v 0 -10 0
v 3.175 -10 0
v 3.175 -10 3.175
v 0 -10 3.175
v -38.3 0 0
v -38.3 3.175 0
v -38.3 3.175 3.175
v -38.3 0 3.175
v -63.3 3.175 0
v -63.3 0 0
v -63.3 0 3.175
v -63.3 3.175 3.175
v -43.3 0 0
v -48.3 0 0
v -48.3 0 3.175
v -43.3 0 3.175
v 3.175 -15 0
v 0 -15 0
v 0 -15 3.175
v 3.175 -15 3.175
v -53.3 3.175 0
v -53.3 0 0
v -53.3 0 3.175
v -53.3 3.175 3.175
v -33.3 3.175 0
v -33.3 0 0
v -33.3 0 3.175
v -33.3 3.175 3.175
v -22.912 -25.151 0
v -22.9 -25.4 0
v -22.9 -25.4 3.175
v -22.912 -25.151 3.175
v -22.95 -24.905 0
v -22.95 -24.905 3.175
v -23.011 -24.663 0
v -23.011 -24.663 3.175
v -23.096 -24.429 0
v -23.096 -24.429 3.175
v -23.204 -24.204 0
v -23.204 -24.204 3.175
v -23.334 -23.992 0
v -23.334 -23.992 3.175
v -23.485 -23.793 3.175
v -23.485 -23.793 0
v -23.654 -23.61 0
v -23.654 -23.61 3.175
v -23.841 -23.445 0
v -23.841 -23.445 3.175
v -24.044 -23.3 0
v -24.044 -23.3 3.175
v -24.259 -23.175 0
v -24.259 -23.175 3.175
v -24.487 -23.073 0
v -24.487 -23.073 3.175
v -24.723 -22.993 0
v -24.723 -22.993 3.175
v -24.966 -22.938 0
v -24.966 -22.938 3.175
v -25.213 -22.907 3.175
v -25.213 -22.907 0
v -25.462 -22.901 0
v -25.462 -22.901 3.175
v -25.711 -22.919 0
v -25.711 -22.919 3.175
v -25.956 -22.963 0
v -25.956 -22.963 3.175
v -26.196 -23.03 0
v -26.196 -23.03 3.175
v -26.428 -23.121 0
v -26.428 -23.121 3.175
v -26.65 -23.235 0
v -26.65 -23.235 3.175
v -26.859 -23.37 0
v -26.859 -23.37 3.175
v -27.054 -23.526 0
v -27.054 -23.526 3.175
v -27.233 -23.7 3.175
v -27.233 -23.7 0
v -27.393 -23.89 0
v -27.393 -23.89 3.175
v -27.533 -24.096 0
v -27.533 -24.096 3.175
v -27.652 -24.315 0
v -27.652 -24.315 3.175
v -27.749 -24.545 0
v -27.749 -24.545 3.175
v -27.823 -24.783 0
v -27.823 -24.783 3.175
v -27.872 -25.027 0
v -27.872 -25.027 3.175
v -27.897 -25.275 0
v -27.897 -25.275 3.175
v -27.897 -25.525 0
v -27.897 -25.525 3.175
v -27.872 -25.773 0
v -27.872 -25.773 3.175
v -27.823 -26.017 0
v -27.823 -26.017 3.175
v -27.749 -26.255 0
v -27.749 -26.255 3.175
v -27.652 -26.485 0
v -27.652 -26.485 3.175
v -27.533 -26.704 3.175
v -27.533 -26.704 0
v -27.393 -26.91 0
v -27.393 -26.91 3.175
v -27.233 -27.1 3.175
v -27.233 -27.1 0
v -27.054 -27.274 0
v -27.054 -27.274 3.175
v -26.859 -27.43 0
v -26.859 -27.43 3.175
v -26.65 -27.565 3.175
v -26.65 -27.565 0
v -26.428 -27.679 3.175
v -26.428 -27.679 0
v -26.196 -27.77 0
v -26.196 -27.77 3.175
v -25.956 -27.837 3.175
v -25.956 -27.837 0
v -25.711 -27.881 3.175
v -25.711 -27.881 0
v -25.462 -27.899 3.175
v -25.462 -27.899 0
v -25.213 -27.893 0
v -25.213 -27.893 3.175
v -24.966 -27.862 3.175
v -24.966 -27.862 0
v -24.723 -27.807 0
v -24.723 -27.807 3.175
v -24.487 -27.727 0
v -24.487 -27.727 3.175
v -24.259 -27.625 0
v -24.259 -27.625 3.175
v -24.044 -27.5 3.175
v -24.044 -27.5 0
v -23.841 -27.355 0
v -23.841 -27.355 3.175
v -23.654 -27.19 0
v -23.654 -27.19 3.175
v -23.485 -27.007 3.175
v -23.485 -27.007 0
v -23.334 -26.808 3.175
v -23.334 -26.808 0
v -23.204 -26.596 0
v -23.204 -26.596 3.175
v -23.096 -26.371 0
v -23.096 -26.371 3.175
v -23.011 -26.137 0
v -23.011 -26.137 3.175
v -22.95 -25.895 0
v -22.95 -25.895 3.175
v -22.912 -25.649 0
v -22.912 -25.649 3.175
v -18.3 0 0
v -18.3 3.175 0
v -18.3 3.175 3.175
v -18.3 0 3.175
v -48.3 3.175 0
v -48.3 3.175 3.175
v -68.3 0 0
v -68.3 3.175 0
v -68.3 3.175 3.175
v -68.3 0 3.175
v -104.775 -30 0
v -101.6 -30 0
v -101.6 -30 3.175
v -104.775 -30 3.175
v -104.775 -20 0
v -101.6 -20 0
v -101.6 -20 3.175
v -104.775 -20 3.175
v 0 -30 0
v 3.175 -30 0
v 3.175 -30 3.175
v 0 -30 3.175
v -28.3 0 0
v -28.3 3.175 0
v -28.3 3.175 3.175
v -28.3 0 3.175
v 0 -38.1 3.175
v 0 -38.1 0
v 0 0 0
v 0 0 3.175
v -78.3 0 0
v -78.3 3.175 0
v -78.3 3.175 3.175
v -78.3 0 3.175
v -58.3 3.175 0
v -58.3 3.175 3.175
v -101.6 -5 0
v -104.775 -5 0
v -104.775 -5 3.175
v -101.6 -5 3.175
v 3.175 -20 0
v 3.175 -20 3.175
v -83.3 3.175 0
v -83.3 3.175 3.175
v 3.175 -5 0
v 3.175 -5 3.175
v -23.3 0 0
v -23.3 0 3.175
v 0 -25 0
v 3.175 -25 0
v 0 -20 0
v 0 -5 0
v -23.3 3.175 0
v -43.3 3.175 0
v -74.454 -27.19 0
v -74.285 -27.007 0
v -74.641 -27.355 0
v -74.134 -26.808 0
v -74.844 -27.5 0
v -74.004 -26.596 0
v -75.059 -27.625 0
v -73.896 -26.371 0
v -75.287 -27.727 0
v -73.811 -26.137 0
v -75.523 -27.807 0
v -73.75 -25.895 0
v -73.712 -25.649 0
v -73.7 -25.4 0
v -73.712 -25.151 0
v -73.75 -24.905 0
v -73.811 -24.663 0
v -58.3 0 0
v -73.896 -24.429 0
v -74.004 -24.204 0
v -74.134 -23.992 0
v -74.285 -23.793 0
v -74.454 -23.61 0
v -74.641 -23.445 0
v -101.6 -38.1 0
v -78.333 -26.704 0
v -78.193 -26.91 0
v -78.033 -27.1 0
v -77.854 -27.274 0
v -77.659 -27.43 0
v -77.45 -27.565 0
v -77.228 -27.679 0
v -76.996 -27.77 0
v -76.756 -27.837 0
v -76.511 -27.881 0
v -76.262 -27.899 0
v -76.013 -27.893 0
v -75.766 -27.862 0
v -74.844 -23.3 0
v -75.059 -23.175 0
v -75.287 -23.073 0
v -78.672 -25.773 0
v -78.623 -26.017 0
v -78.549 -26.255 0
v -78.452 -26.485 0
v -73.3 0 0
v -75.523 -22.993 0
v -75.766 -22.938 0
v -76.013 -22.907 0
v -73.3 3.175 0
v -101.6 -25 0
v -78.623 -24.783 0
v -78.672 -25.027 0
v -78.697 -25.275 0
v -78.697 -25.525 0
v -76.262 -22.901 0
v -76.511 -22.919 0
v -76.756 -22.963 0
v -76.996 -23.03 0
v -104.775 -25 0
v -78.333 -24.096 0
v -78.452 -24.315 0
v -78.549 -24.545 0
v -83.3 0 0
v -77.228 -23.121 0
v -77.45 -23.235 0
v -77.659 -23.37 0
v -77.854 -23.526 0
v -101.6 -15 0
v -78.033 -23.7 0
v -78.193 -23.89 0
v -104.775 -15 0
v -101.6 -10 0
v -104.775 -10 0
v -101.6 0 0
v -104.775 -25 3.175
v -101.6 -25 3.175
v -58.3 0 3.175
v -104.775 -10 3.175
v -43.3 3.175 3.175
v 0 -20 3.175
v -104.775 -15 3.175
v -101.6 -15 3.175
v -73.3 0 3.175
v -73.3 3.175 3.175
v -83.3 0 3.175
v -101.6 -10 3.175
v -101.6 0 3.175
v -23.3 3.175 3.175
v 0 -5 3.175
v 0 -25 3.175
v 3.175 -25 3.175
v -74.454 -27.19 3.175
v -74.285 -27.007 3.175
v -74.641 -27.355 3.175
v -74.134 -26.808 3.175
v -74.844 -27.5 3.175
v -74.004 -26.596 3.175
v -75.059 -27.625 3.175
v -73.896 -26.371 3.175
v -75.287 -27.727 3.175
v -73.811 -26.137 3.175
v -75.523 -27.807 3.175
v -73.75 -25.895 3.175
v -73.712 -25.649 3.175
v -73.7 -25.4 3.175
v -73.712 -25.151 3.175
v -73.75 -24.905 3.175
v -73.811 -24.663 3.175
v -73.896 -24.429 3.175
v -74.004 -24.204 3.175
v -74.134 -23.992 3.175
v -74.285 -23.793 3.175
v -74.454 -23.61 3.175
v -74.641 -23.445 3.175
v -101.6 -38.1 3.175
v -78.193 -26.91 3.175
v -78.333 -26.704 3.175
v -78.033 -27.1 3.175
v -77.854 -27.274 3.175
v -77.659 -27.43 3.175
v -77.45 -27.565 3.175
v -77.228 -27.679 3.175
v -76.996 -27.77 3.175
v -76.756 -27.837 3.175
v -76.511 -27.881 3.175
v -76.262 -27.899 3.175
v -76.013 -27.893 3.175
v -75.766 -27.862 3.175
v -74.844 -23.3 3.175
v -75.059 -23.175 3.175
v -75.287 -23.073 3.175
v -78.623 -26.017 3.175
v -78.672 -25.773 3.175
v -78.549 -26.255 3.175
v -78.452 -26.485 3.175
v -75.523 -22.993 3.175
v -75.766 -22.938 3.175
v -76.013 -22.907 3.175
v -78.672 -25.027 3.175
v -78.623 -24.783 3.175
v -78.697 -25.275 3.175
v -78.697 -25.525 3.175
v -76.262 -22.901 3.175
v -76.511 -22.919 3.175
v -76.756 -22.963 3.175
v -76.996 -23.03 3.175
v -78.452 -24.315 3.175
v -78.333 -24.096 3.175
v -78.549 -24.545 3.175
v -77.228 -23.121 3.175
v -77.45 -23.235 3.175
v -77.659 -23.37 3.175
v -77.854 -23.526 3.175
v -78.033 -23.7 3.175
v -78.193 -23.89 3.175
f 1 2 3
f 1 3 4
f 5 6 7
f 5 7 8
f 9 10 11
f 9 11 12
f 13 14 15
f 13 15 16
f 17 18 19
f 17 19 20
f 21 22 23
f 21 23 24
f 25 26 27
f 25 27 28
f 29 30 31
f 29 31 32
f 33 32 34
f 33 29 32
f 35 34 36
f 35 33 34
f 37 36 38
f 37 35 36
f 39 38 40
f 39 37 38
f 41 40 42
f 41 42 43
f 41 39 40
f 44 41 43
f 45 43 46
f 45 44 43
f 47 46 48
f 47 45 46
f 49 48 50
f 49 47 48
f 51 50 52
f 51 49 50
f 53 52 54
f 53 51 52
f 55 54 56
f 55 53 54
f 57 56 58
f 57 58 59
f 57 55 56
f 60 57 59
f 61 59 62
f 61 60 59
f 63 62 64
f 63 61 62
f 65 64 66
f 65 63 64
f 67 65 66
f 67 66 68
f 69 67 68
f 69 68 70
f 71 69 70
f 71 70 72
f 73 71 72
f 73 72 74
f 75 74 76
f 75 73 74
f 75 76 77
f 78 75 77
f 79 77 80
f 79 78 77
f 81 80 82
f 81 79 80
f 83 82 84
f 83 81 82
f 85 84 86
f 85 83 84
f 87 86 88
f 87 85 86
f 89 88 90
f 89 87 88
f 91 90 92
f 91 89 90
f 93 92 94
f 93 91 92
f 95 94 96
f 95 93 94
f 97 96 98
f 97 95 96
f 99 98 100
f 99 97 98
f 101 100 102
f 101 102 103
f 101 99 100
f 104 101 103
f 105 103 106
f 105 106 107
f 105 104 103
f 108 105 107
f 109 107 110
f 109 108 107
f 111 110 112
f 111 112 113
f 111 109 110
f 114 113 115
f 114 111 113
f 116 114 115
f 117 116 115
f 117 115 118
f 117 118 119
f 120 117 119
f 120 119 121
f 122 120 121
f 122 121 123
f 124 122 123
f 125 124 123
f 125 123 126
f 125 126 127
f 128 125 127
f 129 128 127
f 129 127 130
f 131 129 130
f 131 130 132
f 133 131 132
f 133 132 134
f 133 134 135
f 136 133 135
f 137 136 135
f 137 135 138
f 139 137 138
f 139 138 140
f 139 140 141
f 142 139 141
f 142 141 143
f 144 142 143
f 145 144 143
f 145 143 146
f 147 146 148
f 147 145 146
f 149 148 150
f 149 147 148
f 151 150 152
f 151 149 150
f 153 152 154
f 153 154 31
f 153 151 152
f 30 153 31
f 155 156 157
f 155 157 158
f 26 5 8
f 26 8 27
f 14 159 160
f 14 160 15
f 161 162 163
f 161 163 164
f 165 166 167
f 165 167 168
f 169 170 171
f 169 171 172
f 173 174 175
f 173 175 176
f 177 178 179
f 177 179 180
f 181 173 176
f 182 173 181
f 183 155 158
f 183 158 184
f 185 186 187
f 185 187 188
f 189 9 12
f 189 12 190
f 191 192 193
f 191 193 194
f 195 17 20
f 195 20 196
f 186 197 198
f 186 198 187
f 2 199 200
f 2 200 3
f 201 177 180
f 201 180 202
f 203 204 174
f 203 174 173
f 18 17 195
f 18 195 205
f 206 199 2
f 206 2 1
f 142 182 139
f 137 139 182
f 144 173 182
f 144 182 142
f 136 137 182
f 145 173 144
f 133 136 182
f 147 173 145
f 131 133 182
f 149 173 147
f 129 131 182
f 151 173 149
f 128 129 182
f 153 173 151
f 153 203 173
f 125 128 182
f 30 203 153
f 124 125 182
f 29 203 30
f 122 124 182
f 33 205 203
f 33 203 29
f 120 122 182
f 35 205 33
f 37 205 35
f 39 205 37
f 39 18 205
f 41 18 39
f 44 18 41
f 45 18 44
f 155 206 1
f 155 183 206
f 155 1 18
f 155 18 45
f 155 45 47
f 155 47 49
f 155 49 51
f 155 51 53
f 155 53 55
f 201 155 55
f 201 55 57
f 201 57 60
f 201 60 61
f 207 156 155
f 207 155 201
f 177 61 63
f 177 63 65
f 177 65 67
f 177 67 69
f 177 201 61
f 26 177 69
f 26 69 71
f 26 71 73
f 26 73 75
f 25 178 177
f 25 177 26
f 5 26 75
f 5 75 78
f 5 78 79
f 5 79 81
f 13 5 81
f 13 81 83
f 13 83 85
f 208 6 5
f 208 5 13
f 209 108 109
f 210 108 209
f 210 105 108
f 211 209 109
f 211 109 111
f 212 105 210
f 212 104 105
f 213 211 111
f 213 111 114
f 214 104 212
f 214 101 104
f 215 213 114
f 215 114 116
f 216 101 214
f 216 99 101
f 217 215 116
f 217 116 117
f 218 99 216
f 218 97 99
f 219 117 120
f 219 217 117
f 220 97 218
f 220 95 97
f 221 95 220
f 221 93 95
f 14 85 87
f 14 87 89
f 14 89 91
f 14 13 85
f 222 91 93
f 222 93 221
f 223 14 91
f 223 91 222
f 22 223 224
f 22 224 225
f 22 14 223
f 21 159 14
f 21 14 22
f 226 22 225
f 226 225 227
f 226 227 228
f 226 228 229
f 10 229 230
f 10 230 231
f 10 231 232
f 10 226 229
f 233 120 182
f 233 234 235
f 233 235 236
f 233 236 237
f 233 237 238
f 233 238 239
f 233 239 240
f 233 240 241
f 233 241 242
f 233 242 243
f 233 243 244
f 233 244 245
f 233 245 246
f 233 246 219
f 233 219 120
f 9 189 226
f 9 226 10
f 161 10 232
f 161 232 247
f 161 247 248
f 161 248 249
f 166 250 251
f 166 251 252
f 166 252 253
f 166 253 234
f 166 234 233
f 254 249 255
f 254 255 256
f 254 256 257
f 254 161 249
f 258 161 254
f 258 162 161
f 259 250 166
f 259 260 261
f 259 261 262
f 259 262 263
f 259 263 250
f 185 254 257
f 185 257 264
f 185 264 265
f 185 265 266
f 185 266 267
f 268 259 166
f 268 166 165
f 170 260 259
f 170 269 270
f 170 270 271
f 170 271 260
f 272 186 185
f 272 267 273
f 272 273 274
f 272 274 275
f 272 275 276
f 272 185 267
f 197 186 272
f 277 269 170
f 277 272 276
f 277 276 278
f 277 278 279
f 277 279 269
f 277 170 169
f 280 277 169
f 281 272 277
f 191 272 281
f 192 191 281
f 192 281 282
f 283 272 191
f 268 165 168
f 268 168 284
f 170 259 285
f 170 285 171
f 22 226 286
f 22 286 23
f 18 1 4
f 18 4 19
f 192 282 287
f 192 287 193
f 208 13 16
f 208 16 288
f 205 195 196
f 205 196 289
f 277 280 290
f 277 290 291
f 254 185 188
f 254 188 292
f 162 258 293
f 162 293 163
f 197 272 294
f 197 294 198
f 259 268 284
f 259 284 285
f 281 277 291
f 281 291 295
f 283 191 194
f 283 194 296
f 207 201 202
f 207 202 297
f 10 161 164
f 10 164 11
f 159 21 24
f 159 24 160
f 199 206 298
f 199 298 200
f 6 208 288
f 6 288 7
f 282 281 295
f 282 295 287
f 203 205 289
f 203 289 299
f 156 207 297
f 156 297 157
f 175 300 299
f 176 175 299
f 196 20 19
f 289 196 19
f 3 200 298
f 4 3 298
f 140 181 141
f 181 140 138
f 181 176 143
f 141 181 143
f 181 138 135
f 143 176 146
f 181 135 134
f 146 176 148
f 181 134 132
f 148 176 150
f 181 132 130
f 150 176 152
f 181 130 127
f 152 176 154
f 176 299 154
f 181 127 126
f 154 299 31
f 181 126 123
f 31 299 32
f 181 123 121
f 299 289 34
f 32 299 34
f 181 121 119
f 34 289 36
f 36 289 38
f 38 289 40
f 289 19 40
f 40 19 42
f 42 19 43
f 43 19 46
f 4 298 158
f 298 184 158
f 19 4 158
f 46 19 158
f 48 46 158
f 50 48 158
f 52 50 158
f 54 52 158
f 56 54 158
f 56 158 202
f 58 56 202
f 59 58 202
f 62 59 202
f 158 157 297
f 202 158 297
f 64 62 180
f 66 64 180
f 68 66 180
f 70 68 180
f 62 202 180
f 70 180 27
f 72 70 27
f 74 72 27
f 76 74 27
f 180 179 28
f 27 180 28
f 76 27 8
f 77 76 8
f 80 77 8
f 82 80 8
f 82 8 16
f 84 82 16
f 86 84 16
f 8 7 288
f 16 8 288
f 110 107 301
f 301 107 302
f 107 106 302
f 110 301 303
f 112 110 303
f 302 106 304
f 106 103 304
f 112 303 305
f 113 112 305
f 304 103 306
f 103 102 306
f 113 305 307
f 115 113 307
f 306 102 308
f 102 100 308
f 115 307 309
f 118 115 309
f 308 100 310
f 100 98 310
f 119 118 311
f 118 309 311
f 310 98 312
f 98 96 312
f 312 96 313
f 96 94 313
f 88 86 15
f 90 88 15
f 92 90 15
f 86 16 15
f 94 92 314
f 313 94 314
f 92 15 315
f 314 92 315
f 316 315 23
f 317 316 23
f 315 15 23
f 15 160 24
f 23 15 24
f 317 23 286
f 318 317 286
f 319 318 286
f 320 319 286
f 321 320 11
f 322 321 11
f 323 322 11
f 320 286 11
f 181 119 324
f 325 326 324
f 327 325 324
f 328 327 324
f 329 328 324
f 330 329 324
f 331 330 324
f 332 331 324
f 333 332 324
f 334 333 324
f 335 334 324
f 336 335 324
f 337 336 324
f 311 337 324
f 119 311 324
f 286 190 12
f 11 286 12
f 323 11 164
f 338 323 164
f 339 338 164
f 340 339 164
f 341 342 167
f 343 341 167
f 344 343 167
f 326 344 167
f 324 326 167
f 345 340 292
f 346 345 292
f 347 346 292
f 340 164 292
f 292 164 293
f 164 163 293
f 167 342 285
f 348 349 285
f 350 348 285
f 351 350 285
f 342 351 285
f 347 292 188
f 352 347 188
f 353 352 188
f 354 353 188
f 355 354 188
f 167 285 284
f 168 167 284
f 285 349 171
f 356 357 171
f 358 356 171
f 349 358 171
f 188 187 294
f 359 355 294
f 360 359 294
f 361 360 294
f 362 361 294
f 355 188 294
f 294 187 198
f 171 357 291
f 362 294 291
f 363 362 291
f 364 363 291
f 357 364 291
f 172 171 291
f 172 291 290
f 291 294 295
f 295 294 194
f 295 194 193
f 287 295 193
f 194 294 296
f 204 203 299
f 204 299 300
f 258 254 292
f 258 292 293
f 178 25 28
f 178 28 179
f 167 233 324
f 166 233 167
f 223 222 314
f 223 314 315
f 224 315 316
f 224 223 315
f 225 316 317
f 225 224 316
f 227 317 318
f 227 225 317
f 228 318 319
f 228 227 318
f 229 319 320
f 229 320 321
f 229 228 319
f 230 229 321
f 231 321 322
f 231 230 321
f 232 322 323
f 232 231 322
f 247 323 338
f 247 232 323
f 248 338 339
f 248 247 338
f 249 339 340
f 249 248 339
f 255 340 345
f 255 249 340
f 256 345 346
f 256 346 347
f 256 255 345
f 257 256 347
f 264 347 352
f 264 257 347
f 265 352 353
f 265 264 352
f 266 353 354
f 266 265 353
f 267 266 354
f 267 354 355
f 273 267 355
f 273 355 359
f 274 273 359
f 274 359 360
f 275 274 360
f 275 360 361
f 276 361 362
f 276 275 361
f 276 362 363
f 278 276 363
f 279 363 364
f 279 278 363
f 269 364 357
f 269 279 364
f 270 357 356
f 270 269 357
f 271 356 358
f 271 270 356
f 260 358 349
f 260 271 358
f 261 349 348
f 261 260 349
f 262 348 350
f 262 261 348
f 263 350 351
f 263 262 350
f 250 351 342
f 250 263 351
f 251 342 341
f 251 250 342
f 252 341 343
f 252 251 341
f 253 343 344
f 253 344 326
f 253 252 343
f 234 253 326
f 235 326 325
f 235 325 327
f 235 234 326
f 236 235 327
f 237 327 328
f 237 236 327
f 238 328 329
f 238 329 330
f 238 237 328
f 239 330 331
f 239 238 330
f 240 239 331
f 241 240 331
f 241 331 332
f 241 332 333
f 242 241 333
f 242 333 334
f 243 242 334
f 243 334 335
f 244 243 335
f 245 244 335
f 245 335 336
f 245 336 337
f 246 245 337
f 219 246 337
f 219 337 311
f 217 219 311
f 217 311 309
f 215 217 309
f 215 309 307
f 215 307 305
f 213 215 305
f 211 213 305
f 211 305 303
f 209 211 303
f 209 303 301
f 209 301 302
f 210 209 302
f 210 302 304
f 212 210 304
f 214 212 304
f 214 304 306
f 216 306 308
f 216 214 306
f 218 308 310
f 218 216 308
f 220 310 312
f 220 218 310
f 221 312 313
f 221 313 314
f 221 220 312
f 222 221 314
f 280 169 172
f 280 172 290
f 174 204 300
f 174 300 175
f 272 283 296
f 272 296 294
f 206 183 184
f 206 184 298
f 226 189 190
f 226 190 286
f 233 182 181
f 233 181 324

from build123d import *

# Parameters (mm, degrees)
SKETCH1_R           = 2.5
BOSS_EXTRUDE1_DEPTH = 3.175


with BuildPart() as part:
    # Sketch1 → Boss-Extrude1 (new body)
    with BuildSketch(Plane.XY):
        Polygon((-101.6, 0), (-83.3, 0), (-83.3, 3.175), (-78.3, 3.175), (-78.3, 0), (-73.3, 0), (-73.3, 3.175), (-68.3, 3.175), (-68.3, 0), (-63.3, 0), (-63.3, 3.175), (-58.3, 3.175), (-58.3, 0), (-53.3, 0), (-53.3, 3.175), (-48.3, 3.175), (-48.3, 0), (-43.3, 0), (-43.3, 3.175), (-38.3, 3.175), (-38.3, 0), (-33.3, 0), (-33.3, 3.175), (-28.3, 3.175), (-28.3, 0), (-23.3, 0), (-23.3, 3.175), (-18.3, 3.175), (-18.3, 0), (0, 0), (0, -5), (3.175, -5), (3.175, -10), (0, -10), (0, -15), (3.175, -15), (3.175, -20), (0, -20), (0, -25), (3.175, -25), (3.175, -30), (0, -30), (0, -38.1), (-101.6, -38.1), (-101.6, -30), (-104.775, -30), (-104.775, -25), (-101.6, -25), (-101.6, -20), (-104.775, -20), (-104.775, -15), (-101.6, -15), (-101.6, -10), (-104.775, -10), (-104.775, -5), (-101.6, -5), align=None)
        with Locations((-76.2, -25.4)):
            Circle(SKETCH1_R, mode=Mode.SUBTRACT)
        with Locations((-25.4, -25.4)):
            Circle(SKETCH1_R, mode=Mode.SUBTRACT)
    extrude(amount=BOSS_EXTRUDE1_DEPTH)


solid = part.part
